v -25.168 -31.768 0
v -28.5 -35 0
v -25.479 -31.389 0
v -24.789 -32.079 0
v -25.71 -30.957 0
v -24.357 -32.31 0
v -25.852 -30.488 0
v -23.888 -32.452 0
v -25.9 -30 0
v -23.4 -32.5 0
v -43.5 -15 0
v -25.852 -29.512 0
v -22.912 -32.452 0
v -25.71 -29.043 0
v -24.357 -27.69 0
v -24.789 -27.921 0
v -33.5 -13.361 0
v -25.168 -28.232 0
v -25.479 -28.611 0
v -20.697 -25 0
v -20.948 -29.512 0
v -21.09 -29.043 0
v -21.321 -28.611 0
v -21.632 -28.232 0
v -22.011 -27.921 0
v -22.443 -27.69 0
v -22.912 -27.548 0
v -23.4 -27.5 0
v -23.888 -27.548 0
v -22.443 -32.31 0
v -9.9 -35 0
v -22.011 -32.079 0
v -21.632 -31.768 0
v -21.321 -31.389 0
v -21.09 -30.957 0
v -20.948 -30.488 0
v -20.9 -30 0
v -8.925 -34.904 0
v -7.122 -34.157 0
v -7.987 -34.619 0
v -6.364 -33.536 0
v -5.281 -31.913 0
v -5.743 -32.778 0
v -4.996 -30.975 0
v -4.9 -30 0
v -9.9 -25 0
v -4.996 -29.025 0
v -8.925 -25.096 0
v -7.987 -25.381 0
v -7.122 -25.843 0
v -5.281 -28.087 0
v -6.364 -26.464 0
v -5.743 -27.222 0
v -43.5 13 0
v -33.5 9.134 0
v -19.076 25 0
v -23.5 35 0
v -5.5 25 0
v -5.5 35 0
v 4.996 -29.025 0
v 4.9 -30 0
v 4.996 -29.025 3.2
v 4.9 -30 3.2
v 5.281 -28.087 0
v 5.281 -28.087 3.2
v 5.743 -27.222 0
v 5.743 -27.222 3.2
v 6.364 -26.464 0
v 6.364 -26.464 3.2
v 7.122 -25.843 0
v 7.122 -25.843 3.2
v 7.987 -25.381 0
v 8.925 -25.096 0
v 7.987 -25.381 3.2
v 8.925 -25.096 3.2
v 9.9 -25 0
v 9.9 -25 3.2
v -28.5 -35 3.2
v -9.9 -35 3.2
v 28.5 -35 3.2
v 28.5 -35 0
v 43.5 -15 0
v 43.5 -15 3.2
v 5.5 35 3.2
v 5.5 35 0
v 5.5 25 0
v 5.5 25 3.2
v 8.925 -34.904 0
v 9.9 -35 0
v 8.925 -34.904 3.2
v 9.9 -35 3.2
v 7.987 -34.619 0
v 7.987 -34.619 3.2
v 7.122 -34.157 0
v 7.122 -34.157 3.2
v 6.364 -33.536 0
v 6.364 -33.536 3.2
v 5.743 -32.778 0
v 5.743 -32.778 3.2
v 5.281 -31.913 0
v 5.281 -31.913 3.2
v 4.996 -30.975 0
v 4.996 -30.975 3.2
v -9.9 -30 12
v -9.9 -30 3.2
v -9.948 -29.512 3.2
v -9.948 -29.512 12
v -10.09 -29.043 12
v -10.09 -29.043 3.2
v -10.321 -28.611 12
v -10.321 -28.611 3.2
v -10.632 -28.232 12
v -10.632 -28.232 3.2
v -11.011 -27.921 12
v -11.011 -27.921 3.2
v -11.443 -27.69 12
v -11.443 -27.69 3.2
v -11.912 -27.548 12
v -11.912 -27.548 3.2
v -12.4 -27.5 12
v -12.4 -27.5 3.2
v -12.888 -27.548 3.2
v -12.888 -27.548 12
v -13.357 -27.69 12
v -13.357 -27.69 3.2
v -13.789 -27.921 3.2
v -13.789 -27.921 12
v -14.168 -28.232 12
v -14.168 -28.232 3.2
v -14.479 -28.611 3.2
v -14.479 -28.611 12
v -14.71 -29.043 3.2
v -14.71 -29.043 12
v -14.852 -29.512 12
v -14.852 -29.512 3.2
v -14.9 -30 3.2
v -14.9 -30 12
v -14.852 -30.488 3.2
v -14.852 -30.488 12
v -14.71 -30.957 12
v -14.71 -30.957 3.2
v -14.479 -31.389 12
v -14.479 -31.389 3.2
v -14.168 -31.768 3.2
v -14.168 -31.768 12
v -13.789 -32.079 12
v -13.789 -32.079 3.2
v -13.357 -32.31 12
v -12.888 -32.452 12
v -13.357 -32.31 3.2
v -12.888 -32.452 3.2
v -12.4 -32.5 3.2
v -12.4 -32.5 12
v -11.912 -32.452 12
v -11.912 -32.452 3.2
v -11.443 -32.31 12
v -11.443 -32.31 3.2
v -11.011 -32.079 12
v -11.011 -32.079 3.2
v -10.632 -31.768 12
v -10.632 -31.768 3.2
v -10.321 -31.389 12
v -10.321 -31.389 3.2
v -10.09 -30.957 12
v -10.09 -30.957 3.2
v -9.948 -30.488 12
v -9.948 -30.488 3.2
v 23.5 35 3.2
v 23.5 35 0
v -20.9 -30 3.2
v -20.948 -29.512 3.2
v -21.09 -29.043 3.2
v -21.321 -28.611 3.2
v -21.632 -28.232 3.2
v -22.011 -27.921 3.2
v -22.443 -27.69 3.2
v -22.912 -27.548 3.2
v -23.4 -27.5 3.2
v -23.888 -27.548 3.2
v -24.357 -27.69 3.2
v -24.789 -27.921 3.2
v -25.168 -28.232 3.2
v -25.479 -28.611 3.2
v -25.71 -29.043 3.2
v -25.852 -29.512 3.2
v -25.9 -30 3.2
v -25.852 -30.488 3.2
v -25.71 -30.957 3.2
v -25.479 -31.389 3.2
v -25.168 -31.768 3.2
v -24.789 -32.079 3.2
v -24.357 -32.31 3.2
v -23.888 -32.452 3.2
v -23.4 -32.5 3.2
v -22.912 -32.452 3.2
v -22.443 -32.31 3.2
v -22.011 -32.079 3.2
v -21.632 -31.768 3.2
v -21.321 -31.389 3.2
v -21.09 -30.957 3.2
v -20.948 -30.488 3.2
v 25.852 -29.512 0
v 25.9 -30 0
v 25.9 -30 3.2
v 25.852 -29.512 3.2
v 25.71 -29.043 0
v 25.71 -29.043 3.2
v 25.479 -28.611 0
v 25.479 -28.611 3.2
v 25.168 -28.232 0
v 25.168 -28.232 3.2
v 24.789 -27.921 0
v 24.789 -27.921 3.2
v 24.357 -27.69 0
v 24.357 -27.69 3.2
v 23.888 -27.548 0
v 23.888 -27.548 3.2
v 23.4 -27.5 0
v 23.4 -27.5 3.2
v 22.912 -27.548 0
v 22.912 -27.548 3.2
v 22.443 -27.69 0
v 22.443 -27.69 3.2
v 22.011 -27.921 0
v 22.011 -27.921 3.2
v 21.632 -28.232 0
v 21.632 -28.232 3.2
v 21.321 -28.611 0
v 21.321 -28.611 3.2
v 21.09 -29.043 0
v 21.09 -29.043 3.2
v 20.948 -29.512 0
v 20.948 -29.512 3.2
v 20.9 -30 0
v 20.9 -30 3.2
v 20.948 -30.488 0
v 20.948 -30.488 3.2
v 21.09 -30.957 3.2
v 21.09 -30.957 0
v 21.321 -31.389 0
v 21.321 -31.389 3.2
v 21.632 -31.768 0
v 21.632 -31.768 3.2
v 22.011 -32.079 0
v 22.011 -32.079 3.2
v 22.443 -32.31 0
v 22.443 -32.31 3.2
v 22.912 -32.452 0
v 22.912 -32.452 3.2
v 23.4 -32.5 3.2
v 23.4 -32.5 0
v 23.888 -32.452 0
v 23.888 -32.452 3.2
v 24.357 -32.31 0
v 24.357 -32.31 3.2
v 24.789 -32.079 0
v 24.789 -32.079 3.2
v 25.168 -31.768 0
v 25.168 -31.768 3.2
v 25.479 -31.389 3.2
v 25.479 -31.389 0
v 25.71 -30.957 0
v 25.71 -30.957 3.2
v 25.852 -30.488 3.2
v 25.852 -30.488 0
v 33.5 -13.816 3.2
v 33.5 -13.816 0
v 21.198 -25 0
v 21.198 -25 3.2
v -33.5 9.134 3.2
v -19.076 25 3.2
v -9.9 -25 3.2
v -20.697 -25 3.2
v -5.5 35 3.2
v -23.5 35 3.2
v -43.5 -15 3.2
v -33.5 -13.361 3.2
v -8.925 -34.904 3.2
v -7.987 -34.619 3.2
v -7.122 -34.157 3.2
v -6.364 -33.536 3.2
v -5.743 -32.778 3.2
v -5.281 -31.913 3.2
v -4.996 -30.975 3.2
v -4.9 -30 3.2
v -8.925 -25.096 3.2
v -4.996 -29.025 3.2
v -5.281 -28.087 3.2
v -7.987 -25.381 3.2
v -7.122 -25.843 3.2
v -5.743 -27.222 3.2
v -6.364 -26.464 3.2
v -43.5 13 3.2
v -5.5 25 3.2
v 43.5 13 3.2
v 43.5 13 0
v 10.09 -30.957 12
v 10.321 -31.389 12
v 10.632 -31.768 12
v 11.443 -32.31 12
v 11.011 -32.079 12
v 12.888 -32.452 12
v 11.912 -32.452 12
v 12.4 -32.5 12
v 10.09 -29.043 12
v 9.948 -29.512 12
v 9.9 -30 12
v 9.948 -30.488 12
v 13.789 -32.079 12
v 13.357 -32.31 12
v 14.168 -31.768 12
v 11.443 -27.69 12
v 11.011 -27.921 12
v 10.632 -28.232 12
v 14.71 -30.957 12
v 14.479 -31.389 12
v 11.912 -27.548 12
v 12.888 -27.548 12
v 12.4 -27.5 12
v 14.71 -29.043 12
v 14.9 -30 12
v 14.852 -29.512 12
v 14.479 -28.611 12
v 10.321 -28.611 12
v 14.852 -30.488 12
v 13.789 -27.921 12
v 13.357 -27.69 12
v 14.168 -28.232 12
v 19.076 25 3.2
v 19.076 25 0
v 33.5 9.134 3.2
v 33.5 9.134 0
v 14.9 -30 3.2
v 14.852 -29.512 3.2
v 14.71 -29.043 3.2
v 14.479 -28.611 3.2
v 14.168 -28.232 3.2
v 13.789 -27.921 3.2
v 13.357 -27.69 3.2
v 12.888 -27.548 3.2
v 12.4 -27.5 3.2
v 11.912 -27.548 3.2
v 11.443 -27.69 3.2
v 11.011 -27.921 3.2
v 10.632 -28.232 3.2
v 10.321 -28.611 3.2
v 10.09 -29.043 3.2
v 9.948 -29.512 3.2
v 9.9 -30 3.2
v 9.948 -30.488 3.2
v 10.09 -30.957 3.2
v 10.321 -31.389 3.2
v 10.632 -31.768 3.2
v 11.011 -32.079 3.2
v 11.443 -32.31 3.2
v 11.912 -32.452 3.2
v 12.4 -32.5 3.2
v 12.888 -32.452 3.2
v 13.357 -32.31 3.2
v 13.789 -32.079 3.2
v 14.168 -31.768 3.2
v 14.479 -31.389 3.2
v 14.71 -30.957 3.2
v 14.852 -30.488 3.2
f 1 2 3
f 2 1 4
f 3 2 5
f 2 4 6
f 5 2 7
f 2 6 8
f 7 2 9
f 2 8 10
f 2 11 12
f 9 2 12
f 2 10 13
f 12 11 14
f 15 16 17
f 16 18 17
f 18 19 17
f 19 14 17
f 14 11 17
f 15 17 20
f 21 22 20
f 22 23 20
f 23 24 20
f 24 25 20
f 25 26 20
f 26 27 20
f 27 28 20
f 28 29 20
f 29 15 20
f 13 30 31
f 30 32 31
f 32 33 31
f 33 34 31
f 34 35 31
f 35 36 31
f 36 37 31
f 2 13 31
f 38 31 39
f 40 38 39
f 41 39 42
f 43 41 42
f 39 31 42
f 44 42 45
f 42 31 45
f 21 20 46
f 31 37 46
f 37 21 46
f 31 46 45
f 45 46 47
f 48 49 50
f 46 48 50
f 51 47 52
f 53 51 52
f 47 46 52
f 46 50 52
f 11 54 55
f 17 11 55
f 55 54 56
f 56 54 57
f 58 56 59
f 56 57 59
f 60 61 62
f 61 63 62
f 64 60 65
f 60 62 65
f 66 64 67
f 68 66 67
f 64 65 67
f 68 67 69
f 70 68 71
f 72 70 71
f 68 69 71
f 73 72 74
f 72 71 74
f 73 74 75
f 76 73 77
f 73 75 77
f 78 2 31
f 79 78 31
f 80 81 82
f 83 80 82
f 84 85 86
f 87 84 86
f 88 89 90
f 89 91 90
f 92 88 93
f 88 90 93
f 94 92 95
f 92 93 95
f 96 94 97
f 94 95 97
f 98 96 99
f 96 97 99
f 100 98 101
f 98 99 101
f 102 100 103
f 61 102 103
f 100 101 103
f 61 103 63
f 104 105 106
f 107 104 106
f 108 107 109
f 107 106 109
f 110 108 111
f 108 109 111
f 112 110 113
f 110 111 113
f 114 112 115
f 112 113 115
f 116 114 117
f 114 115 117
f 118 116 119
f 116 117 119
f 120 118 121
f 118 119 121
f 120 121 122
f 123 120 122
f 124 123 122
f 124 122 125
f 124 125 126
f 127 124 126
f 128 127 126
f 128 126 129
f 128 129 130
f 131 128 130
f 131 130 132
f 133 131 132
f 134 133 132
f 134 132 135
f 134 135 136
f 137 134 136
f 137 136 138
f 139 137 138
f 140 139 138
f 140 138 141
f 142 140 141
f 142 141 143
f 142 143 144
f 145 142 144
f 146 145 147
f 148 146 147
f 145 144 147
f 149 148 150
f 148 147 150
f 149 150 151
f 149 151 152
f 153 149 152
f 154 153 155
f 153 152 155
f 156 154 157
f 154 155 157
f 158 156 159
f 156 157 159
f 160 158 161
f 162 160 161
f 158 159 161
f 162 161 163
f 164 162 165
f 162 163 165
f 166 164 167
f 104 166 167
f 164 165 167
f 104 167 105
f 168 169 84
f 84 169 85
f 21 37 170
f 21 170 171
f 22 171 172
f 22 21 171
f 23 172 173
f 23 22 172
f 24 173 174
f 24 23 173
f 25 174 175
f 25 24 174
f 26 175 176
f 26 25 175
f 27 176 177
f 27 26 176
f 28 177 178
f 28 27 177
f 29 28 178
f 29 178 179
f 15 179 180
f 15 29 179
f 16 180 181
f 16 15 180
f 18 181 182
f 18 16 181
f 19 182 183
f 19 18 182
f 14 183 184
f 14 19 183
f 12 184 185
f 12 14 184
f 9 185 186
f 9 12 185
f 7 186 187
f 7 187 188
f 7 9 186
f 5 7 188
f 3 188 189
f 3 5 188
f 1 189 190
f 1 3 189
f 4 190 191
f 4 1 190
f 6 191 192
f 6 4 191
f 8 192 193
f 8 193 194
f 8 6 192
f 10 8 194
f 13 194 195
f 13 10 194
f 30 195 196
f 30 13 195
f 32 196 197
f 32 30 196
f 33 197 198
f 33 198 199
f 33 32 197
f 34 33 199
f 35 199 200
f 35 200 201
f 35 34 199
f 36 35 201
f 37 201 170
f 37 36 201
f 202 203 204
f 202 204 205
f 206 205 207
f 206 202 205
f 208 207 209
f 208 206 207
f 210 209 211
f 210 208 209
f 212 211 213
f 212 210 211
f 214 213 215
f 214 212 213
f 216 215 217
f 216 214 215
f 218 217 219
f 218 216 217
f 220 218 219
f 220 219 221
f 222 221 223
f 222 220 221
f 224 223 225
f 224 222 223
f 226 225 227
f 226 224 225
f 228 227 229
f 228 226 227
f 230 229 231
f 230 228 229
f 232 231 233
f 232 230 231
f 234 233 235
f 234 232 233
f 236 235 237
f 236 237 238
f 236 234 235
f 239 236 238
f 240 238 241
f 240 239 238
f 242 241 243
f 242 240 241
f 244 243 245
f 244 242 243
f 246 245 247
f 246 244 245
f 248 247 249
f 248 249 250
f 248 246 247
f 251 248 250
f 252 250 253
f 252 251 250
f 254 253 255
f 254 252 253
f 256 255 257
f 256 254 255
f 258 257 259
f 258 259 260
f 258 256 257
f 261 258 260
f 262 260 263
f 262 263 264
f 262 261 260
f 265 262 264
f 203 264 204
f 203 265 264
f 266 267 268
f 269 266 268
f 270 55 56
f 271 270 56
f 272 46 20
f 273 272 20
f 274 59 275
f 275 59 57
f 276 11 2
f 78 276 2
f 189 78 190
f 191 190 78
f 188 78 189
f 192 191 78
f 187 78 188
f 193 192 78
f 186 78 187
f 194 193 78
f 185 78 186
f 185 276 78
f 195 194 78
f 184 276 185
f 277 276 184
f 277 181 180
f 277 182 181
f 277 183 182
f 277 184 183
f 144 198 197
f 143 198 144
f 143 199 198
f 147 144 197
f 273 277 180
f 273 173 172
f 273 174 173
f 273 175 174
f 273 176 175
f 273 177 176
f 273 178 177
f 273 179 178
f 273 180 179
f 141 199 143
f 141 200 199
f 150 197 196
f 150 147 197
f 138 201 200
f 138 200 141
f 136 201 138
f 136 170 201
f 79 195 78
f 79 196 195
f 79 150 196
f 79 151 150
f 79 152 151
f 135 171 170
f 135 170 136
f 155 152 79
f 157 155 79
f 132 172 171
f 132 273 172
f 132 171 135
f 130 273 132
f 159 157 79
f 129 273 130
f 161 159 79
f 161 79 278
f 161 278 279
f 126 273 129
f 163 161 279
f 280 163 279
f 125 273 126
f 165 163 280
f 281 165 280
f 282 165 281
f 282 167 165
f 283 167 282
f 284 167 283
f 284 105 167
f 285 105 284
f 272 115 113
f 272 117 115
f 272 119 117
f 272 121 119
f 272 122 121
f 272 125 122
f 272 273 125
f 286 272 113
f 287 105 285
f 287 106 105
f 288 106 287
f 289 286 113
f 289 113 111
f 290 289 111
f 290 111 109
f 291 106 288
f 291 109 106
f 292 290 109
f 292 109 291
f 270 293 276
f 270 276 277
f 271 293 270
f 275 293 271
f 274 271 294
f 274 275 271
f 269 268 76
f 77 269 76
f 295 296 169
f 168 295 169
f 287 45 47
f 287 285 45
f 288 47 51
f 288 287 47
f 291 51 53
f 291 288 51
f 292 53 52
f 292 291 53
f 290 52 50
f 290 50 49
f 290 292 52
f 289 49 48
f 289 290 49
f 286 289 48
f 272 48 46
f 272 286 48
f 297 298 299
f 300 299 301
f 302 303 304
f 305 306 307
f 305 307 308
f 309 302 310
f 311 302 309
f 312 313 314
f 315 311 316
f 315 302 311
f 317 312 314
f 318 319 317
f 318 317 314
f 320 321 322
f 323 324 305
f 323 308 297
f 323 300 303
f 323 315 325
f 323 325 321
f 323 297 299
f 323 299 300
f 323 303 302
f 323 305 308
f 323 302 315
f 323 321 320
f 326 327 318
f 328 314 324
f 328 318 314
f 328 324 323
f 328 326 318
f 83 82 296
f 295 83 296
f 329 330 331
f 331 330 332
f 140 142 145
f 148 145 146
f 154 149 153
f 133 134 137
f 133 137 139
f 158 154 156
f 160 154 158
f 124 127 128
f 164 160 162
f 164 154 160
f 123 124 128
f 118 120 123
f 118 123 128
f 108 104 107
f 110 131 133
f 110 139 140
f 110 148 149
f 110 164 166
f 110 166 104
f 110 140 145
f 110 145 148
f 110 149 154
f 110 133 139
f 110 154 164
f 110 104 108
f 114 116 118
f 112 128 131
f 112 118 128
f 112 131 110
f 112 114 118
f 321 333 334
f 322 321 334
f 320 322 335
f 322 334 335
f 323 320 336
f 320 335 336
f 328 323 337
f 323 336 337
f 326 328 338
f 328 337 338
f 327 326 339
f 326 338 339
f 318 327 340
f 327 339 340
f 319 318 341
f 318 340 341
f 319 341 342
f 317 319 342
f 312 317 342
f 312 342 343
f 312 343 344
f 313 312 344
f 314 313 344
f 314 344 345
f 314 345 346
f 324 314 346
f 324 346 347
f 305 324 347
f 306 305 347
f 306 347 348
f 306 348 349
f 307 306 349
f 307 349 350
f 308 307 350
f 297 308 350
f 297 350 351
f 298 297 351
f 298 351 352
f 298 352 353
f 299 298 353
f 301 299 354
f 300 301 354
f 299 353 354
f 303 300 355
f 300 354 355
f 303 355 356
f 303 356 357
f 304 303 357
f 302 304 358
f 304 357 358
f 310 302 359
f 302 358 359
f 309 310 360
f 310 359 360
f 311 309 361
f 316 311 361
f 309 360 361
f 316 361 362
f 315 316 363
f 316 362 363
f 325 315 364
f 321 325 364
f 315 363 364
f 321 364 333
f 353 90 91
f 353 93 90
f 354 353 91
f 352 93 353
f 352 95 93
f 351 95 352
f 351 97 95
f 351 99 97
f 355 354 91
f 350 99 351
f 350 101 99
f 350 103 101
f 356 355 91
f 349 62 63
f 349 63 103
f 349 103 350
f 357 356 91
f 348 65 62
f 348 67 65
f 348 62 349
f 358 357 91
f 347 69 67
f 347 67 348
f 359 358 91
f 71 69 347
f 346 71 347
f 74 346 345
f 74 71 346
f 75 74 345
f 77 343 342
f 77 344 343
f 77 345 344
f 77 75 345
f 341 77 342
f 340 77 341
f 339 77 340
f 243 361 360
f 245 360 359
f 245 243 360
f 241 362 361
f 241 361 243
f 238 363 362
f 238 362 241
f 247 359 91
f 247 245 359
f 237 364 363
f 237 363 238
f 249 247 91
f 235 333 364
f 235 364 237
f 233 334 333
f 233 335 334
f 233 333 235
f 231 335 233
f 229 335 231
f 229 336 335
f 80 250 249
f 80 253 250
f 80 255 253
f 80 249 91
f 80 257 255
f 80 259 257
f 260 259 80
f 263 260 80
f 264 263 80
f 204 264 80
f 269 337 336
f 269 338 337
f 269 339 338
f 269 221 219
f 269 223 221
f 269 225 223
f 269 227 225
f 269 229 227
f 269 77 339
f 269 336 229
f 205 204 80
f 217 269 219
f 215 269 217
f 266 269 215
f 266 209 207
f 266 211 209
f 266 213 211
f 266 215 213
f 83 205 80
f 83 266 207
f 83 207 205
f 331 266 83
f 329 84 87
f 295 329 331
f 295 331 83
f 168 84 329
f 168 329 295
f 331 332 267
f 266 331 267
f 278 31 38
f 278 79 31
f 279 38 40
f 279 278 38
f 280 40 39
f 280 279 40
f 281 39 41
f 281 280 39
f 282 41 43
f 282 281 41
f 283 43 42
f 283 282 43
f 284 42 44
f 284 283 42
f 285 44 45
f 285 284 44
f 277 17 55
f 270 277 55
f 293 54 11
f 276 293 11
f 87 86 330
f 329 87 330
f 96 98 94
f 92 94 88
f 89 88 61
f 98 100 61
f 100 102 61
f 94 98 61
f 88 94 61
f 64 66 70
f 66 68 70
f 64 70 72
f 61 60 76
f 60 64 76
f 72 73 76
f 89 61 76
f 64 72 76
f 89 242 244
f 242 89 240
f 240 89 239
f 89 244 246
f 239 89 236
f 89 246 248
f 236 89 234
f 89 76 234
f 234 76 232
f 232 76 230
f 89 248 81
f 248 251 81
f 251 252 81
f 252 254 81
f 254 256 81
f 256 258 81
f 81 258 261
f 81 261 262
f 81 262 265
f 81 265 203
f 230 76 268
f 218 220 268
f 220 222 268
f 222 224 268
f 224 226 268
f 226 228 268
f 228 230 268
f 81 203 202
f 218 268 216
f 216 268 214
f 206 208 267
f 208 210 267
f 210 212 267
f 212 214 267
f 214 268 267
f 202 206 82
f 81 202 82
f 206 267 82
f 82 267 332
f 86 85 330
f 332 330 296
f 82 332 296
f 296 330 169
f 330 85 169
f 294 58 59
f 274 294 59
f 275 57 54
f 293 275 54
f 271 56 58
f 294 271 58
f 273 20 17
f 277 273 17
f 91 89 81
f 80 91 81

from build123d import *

# Parameters (mm, degrees)
F0_R     = 2.5
F1_DEPTH = 3.2
F2_DEPTH = 12
F3_DEPTH = 12
F4_R     = 4.99999
F5_R     = 4.99999


# Not quite as in the source:
# - a fillet or chamfer is up to 0.001 mm smaller than in the source, because OpenCascade refuses the exact size


with BuildPart() as f1:
    # F0 (on Top) → F1 (new body)
    with BuildSketch(Plane.XY):
        Polygon((4.9, -35), (28.5, -35), (43.5, -15), (43.5, 13), (23.5, 35), (5.5, 35), (5.5, 25), (19.0763011388, 25), (33.5, 9.1339312527), (33.5, -13.8162449002), (21.1978693902, -25), (4.9, -25), align=None)
        with Locations((12.4, -30)):
            Circle(F0_R, mode=Mode.SUBTRACT)
        with Locations((23.4, -30)):
            Circle(F0_R, mode=Mode.SUBTRACT)
    extrude(amount=F1_DEPTH)

    # F0 (on Top) → F2 (join)
    with BuildSketch(Plane.XY):
        with Locations((12.4, -30)):
            Circle(F0_R)
    extrude(amount=F2_DEPTH)

    # F4 (radius 5 in the source; OpenCascade refuses exactly that, so slightly less here)
    f4_edges = [f1.edges().sort_by_distance(p)[0] for p in [
        (4.9, -35, 1.6),
        (4.9, -25, 1.6),
    ]]
    fillet(f4_edges, radius=F4_R)


with BuildPart() as f1b:
    # F0 (on Top) → F1, piece 2 (new body)
    with BuildSketch(Plane.XY):
        Polygon((-28.5, -35), (-4.9, -35), (-4.9, -25), (-20.6968208253, -25), (-33.5, -13.3607462049), (-33.5, 9.1339312527), (-19.0763011388, 25), (-5.5, 25), (-5.5, 35), (-23.5, 35), (-43.5, 13), (-43.5, -15), align=None)
        with Locations((-23.4, -30)):
            Circle(F0_R, mode=Mode.SUBTRACT)
        with Locations((-12.4, -30)):
            Circle(F0_R, mode=Mode.SUBTRACT)
    extrude(amount=F1_DEPTH)

    # F0 (on Top) → F3 (join)
    with BuildSketch(Plane.XY):
        with Locations((-12.4, -30)):
            Circle(F0_R)
    extrude(amount=F3_DEPTH)

    # F5 (radius 5 in the source; OpenCascade refuses exactly that, so slightly less here)
    f5_edges = [f1b.edges().sort_by_distance(p)[0] for p in [
        (-4.9, -35, 1.6),
        (-4.9, -25, 1.6),
    ]]
    fillet(f5_edges, radius=F5_R)


solid = Compound([f1.part, f1b.part])
